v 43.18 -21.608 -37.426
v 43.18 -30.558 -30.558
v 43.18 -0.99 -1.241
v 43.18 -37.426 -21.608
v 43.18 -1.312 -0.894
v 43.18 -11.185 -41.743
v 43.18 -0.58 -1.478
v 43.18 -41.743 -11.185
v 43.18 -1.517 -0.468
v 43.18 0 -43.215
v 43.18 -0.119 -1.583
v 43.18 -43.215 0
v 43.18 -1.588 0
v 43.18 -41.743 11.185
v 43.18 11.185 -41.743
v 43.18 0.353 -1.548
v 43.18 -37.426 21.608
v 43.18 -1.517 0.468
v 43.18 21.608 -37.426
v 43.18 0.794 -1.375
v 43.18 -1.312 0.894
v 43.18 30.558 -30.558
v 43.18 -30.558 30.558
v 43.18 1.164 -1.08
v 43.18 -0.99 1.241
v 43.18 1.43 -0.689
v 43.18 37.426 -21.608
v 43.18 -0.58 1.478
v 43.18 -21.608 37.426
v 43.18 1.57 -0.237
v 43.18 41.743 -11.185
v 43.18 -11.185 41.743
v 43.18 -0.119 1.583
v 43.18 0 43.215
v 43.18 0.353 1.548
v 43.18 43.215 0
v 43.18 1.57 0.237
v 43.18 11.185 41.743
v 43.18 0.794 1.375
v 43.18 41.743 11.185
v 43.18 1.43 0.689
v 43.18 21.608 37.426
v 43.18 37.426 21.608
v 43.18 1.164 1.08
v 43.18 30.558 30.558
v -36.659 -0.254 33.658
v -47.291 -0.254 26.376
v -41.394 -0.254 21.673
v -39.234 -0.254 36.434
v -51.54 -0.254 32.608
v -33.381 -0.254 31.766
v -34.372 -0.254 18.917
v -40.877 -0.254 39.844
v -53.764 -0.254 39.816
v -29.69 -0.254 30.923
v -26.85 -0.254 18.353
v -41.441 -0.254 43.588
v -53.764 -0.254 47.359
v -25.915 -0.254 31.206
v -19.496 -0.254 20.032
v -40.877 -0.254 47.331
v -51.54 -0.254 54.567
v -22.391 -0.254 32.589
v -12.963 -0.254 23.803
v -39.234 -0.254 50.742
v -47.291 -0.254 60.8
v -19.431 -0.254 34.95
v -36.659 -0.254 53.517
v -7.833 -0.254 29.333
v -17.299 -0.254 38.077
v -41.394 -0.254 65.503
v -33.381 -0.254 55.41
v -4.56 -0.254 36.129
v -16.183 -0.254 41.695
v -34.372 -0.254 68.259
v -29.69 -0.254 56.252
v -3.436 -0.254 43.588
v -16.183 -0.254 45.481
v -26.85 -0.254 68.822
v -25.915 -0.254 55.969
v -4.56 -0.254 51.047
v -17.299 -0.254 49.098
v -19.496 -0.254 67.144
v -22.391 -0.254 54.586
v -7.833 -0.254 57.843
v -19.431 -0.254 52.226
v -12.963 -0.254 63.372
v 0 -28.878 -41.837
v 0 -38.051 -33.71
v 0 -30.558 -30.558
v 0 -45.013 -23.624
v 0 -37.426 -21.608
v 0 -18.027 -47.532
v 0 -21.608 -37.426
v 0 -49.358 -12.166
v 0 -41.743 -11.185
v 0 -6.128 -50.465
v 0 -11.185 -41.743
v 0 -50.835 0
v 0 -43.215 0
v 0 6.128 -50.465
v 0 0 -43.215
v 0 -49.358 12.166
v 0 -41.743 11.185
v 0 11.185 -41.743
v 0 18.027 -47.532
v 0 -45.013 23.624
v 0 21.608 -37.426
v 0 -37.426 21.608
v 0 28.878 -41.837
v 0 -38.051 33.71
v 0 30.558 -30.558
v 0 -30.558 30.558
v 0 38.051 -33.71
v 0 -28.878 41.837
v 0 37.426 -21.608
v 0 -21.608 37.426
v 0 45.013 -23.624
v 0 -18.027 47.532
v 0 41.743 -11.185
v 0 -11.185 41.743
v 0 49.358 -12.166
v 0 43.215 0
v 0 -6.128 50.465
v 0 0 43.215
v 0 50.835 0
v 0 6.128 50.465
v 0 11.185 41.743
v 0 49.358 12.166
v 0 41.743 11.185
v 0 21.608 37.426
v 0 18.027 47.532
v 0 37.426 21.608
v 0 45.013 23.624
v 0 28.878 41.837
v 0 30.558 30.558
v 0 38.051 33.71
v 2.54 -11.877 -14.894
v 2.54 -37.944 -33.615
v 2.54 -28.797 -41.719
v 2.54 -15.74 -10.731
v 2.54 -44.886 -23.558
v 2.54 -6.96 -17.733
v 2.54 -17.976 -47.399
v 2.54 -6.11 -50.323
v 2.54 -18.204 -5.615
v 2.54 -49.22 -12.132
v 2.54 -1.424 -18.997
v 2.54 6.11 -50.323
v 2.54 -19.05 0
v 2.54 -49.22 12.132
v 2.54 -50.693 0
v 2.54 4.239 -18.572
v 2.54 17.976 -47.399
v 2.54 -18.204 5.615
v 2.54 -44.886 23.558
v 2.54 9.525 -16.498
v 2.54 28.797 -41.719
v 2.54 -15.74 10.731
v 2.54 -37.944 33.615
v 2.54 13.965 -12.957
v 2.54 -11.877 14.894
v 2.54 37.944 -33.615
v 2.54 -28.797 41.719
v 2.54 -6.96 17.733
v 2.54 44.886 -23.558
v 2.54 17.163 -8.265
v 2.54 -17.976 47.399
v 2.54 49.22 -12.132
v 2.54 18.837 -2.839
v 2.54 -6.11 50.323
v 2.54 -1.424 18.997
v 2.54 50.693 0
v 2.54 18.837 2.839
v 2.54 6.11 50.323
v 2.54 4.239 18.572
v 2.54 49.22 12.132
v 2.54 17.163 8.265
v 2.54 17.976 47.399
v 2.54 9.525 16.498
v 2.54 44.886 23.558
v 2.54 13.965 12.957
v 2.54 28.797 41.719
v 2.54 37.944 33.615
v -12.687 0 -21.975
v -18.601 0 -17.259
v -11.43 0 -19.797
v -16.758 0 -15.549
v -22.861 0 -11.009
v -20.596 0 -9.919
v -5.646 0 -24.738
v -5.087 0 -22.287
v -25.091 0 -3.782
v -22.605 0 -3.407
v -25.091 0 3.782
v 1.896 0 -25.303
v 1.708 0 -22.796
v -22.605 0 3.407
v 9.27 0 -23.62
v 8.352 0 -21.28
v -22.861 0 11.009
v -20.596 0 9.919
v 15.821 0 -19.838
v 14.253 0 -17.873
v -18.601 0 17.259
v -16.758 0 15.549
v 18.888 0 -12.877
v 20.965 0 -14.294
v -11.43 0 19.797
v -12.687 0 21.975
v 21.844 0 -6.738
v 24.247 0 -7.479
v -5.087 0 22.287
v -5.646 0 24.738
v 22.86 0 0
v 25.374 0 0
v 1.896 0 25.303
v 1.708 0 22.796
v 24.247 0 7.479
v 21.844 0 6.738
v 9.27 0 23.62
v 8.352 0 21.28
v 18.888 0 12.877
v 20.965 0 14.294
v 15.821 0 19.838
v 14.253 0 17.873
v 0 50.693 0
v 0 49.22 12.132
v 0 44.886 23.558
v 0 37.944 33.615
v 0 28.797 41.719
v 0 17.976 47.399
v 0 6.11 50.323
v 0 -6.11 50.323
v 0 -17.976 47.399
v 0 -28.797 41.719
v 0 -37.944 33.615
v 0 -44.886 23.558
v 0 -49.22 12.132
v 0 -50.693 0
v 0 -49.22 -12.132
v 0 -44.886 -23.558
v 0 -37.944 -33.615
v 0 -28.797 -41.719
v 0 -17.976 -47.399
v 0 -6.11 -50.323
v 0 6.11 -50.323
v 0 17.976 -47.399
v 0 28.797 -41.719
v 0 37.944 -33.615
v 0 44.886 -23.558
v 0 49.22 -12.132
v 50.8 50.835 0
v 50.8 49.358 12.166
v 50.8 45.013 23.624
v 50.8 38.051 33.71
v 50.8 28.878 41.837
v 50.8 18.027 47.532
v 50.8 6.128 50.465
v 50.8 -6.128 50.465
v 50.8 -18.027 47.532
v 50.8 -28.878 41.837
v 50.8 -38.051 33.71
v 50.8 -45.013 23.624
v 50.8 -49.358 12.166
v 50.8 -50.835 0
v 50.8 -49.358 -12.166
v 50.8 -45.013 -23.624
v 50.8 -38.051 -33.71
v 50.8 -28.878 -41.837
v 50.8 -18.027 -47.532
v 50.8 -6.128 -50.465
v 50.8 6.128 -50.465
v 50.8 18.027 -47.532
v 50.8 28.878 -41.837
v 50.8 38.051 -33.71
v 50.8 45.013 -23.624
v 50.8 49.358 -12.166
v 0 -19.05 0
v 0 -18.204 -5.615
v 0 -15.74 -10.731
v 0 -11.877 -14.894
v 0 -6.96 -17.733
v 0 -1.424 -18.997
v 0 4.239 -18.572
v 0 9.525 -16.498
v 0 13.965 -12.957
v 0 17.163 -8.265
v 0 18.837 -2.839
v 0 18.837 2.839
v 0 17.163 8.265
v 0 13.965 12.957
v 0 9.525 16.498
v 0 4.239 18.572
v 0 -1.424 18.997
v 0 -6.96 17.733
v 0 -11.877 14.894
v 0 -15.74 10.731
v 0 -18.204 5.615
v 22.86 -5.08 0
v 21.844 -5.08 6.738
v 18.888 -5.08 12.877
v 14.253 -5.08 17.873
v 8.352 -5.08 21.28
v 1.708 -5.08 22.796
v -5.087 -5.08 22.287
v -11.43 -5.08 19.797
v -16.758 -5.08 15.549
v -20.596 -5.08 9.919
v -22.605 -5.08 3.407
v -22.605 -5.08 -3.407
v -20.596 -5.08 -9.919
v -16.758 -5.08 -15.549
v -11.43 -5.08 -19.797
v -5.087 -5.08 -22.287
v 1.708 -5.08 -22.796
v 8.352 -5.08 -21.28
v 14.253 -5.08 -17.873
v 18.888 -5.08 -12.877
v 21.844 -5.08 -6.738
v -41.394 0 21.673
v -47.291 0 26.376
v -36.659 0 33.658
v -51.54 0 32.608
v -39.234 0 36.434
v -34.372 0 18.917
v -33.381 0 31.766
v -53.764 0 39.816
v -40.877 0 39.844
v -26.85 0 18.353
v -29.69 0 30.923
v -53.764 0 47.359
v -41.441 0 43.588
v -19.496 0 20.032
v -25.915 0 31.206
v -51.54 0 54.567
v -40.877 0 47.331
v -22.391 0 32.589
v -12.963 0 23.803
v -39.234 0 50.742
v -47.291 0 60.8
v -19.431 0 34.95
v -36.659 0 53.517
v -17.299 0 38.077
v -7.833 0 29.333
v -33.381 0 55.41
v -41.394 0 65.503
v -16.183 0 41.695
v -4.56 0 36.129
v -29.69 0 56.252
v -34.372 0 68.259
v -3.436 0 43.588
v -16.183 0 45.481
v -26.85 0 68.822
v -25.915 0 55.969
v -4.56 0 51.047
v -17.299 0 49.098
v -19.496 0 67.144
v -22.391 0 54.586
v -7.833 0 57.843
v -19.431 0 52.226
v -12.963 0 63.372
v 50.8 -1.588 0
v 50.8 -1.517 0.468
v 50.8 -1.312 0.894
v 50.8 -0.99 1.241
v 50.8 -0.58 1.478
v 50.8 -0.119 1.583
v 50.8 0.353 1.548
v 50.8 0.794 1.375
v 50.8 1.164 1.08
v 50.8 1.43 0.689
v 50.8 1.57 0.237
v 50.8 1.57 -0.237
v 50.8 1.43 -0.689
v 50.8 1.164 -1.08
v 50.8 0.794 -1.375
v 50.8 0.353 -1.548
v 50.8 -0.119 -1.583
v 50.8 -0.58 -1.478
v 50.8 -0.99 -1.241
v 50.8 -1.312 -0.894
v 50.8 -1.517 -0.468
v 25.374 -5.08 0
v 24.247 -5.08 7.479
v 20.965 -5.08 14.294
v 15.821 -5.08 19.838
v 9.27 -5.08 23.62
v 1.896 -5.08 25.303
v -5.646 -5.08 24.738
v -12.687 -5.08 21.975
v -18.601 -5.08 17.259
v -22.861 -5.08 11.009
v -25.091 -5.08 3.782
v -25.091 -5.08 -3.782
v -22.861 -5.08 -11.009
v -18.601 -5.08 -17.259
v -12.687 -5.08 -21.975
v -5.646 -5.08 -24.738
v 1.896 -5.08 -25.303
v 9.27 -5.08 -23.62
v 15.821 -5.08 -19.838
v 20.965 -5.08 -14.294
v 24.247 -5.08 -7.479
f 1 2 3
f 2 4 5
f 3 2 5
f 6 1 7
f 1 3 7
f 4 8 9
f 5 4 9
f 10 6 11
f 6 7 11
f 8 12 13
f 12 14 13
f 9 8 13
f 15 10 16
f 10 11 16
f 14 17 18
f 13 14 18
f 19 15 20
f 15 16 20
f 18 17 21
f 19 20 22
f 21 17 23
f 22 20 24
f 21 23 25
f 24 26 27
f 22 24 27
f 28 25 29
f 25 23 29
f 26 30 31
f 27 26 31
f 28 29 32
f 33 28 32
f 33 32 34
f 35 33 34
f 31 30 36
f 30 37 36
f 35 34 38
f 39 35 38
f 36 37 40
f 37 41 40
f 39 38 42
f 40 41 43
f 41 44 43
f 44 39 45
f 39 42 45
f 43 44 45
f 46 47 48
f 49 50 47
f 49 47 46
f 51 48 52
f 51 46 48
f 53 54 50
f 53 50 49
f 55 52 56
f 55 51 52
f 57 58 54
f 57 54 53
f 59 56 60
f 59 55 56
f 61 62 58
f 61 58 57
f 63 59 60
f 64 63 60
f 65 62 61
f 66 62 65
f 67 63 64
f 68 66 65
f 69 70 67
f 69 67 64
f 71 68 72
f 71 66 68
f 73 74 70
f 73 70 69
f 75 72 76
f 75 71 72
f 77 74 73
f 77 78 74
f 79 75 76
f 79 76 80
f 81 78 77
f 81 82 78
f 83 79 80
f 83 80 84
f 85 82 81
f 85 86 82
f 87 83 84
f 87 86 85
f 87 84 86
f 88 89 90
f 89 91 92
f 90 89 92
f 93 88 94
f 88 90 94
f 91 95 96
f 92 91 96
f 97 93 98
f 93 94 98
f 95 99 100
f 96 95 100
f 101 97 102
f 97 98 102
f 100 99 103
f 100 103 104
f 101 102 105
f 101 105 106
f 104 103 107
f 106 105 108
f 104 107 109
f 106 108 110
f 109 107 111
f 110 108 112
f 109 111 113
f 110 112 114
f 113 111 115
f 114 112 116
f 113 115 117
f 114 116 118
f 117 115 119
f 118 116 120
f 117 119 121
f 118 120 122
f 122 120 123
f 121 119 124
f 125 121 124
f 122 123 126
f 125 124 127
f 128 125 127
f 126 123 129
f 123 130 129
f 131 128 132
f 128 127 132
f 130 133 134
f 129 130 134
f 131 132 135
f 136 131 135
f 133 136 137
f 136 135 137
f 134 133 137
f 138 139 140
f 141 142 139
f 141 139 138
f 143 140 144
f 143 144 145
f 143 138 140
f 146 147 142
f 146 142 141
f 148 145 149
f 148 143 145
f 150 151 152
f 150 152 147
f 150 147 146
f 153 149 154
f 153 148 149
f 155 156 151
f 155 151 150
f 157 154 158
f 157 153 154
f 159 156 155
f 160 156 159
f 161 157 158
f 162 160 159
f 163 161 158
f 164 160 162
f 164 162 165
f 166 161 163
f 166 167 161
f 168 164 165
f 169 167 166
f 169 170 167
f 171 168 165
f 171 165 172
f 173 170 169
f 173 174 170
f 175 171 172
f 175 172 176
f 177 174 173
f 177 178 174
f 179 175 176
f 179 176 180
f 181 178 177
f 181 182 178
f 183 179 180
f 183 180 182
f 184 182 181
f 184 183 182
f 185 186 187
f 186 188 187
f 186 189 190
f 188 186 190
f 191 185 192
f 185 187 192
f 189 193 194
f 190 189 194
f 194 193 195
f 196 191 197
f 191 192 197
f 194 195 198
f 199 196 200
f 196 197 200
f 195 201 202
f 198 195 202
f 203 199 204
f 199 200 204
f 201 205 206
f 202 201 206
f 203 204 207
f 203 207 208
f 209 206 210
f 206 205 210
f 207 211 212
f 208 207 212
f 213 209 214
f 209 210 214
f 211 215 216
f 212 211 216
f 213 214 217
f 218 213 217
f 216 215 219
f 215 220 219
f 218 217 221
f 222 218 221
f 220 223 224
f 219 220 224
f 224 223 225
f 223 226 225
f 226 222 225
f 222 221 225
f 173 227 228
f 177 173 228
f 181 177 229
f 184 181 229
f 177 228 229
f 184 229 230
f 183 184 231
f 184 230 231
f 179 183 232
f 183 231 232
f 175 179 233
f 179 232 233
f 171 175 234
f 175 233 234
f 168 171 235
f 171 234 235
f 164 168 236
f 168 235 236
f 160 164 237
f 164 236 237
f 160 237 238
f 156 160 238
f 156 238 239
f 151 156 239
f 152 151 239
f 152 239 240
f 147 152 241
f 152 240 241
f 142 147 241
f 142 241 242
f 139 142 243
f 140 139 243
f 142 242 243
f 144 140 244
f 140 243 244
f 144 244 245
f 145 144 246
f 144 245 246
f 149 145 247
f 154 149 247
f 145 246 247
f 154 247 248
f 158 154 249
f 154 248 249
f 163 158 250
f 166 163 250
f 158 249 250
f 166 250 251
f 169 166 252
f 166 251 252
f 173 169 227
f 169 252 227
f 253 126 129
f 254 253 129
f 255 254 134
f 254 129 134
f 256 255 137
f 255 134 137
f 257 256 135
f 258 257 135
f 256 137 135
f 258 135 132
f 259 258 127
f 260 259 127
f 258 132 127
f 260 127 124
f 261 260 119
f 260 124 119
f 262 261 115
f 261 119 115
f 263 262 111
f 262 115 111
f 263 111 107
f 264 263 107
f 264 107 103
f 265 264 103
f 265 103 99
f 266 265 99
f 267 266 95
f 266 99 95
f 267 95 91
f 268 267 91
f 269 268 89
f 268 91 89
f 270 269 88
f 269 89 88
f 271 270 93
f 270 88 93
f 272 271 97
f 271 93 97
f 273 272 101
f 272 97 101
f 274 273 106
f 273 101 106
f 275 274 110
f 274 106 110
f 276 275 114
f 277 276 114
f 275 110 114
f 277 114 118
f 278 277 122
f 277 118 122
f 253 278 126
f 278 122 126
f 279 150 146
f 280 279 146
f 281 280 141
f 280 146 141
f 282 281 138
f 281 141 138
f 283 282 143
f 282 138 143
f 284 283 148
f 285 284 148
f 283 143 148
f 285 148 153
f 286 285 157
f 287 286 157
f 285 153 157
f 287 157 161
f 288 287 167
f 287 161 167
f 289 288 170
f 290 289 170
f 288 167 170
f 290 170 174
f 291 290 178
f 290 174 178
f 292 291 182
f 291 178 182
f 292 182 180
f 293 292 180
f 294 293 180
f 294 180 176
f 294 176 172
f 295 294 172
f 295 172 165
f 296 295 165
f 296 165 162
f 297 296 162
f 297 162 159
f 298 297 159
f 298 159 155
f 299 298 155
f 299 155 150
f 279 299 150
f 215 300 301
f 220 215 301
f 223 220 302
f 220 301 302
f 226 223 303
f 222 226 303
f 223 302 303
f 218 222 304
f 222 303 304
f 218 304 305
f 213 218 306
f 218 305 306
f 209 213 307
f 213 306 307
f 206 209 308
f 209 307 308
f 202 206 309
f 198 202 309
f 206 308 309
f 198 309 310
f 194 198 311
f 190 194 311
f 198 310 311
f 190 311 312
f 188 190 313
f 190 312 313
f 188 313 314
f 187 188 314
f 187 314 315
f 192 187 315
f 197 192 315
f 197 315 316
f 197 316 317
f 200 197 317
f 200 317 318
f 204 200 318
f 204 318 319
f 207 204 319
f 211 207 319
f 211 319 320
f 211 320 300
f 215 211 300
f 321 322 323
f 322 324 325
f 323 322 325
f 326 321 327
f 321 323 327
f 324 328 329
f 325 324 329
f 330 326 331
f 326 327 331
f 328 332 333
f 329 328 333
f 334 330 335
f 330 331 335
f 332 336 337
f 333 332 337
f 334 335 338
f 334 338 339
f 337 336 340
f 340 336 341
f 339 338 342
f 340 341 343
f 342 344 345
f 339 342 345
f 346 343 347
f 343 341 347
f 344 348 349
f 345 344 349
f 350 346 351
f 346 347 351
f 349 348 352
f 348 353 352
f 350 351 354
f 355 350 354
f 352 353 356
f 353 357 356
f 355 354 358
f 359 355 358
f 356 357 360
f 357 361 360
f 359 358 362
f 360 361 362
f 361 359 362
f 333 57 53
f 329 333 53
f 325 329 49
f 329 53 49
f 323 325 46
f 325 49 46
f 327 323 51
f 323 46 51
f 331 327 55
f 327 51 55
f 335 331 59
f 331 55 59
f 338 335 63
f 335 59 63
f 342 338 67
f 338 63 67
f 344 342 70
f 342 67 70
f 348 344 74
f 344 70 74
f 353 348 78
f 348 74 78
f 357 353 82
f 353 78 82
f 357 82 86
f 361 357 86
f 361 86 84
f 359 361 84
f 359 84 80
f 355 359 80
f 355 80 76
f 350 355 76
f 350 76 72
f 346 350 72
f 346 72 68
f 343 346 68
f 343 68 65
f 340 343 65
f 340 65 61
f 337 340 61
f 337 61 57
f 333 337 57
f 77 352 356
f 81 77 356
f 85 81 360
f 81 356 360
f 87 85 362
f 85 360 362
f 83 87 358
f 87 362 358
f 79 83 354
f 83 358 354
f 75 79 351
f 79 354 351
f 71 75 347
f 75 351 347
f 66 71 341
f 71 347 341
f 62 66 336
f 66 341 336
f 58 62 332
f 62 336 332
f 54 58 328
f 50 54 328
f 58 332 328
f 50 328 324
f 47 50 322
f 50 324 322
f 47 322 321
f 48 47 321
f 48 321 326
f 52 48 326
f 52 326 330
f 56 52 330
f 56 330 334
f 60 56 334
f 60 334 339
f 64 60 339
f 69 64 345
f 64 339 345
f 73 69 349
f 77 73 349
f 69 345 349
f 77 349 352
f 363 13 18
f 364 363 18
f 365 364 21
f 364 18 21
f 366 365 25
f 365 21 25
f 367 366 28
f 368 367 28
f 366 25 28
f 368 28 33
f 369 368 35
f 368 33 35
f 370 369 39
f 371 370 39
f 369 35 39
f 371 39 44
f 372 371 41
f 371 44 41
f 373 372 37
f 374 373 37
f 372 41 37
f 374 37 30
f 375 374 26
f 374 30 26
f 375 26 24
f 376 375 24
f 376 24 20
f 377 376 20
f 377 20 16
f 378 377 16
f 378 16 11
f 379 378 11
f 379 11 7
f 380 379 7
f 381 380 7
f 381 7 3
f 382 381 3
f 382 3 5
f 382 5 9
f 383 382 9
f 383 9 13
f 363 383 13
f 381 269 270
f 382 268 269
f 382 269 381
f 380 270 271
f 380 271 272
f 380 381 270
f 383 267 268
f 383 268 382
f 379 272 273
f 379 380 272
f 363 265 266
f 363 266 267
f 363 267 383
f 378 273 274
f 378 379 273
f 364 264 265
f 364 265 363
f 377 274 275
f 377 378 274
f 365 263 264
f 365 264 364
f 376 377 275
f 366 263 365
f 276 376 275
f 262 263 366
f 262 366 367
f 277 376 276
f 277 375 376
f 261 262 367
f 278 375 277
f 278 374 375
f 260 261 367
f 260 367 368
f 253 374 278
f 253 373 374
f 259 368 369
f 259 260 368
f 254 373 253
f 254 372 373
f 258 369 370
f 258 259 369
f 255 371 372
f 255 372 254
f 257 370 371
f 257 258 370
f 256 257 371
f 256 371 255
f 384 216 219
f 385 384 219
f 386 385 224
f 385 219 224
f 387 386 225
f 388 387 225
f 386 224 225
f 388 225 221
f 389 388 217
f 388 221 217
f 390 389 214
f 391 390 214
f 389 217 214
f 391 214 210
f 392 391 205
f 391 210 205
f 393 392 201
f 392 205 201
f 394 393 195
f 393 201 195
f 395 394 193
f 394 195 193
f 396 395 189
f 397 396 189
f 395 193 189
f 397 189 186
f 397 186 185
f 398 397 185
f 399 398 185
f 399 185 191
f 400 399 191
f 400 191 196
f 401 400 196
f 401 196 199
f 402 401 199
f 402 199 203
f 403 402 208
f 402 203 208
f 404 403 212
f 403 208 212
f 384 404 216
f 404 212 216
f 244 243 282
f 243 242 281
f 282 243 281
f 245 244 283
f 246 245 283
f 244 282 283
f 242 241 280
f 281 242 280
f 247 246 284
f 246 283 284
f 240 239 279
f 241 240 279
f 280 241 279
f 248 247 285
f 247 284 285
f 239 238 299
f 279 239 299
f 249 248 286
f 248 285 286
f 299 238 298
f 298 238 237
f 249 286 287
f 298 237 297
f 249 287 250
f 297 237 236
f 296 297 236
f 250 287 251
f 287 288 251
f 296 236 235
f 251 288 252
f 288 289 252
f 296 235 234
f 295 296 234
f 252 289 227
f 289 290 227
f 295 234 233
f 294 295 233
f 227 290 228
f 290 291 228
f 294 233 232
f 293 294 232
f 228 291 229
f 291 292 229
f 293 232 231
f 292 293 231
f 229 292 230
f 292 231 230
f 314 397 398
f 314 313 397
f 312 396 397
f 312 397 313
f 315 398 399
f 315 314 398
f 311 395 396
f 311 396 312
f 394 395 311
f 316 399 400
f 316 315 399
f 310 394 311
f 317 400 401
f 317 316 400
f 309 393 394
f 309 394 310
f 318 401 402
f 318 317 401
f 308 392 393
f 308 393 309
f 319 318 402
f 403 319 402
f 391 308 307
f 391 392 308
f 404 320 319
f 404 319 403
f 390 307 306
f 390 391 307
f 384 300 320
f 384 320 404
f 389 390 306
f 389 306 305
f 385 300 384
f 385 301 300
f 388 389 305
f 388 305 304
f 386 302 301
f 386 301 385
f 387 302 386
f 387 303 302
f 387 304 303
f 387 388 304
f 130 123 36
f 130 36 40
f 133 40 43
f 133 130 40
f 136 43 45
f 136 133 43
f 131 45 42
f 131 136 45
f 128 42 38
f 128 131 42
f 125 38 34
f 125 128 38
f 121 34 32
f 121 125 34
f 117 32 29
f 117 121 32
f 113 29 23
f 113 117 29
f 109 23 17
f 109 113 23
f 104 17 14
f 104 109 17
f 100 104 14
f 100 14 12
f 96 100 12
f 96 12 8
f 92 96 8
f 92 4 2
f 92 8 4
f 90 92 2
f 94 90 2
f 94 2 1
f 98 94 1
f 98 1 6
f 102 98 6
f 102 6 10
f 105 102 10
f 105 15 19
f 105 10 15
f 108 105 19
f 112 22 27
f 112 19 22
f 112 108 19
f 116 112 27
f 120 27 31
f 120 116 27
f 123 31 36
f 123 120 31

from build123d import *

# Parameters (mm, degrees)
F0_R      = 50.8354773478
F1_DEPTH  = 50.8
F2_T      = -7.62
F3_R      = 25.3742065127
F4_DEPTH  = 5.08
F6_D      = 45.72
F7_R      = 25.3749956212
F8_DEPTH  = 1.27
F9_R      = 25.3053826343
F10_DEPTH = 0.254
F11_D     = 25.4
F12_R     = 50.6927186413
F13_DEPTH = 2.54
F14_D     = 38.1
F19_D     = 3.175


with BuildPart() as f1:
    # F0 (on Right) → F1 (new body)
    with BuildSketch(Plane.YZ):
        Circle(F0_R)
    extrude(amount=F1_DEPTH)

    # F2
    f2_openings = [f1.faces().sort_by_distance(p)[0] for p in [
        (0, 0, 0),
    ]]
    offset(amount=F2_T, openings=f2_openings)

    # F19 (through all)
    with Locations(Plane.YZ.offset(50.8)):
        with Locations((0, 0)):
            Hole(F19_D / 2)


with BuildPart() as f4:
    # F3 (on Front) → F4 (new body)
    with BuildSketch(Plane.XZ):
        Circle(F3_R)
    extrude(amount=F4_DEPTH)

    # F6 (through all)
    with Locations(Plane(origin=(0, 0, 0), x_dir=(-1, 0, 0), z_dir=(0, 1, 0))):
        with Locations((0, 0)):
            Hole(F6_D / 2)


with BuildPart() as f8:
    # F7 (on Front) → F8 (new body)
    with BuildSketch(Plane.XZ):
        Circle(F7_R)
    extrude(amount=-F8_DEPTH)


with BuildPart() as f10:
    # F9 (on Front) → F10 (new body)
    with BuildSketch(Plane.XZ):
        with Locations((-28.7408940494, 43.5877144337)):
            Circle(F9_R)
    extrude(amount=F10_DEPTH)

    # F11 (through all)
    with Locations(Plane(origin=(0, 0, 0), x_dir=(1, 0, 0), z_dir=(0, 1, 0))):
        with Locations((-28.7408940494, -43.5877144337)):
            Hole(F11_D / 2)


with BuildPart() as f13:
    # F12 (on Right) → F13 (new body)
    with BuildSketch(Plane.YZ):
        Circle(F12_R)
    extrude(amount=F13_DEPTH)

    # F14 (through all)
    with Locations(Plane(origin=(0, 0, 0), x_dir=(0, 1, 0), z_dir=(-1, 0, 0))):
        with Locations((0, 0)):
            Hole(F14_D / 2)


solid = Compound([f1.part, f4.part, f10.part, f13.part])
